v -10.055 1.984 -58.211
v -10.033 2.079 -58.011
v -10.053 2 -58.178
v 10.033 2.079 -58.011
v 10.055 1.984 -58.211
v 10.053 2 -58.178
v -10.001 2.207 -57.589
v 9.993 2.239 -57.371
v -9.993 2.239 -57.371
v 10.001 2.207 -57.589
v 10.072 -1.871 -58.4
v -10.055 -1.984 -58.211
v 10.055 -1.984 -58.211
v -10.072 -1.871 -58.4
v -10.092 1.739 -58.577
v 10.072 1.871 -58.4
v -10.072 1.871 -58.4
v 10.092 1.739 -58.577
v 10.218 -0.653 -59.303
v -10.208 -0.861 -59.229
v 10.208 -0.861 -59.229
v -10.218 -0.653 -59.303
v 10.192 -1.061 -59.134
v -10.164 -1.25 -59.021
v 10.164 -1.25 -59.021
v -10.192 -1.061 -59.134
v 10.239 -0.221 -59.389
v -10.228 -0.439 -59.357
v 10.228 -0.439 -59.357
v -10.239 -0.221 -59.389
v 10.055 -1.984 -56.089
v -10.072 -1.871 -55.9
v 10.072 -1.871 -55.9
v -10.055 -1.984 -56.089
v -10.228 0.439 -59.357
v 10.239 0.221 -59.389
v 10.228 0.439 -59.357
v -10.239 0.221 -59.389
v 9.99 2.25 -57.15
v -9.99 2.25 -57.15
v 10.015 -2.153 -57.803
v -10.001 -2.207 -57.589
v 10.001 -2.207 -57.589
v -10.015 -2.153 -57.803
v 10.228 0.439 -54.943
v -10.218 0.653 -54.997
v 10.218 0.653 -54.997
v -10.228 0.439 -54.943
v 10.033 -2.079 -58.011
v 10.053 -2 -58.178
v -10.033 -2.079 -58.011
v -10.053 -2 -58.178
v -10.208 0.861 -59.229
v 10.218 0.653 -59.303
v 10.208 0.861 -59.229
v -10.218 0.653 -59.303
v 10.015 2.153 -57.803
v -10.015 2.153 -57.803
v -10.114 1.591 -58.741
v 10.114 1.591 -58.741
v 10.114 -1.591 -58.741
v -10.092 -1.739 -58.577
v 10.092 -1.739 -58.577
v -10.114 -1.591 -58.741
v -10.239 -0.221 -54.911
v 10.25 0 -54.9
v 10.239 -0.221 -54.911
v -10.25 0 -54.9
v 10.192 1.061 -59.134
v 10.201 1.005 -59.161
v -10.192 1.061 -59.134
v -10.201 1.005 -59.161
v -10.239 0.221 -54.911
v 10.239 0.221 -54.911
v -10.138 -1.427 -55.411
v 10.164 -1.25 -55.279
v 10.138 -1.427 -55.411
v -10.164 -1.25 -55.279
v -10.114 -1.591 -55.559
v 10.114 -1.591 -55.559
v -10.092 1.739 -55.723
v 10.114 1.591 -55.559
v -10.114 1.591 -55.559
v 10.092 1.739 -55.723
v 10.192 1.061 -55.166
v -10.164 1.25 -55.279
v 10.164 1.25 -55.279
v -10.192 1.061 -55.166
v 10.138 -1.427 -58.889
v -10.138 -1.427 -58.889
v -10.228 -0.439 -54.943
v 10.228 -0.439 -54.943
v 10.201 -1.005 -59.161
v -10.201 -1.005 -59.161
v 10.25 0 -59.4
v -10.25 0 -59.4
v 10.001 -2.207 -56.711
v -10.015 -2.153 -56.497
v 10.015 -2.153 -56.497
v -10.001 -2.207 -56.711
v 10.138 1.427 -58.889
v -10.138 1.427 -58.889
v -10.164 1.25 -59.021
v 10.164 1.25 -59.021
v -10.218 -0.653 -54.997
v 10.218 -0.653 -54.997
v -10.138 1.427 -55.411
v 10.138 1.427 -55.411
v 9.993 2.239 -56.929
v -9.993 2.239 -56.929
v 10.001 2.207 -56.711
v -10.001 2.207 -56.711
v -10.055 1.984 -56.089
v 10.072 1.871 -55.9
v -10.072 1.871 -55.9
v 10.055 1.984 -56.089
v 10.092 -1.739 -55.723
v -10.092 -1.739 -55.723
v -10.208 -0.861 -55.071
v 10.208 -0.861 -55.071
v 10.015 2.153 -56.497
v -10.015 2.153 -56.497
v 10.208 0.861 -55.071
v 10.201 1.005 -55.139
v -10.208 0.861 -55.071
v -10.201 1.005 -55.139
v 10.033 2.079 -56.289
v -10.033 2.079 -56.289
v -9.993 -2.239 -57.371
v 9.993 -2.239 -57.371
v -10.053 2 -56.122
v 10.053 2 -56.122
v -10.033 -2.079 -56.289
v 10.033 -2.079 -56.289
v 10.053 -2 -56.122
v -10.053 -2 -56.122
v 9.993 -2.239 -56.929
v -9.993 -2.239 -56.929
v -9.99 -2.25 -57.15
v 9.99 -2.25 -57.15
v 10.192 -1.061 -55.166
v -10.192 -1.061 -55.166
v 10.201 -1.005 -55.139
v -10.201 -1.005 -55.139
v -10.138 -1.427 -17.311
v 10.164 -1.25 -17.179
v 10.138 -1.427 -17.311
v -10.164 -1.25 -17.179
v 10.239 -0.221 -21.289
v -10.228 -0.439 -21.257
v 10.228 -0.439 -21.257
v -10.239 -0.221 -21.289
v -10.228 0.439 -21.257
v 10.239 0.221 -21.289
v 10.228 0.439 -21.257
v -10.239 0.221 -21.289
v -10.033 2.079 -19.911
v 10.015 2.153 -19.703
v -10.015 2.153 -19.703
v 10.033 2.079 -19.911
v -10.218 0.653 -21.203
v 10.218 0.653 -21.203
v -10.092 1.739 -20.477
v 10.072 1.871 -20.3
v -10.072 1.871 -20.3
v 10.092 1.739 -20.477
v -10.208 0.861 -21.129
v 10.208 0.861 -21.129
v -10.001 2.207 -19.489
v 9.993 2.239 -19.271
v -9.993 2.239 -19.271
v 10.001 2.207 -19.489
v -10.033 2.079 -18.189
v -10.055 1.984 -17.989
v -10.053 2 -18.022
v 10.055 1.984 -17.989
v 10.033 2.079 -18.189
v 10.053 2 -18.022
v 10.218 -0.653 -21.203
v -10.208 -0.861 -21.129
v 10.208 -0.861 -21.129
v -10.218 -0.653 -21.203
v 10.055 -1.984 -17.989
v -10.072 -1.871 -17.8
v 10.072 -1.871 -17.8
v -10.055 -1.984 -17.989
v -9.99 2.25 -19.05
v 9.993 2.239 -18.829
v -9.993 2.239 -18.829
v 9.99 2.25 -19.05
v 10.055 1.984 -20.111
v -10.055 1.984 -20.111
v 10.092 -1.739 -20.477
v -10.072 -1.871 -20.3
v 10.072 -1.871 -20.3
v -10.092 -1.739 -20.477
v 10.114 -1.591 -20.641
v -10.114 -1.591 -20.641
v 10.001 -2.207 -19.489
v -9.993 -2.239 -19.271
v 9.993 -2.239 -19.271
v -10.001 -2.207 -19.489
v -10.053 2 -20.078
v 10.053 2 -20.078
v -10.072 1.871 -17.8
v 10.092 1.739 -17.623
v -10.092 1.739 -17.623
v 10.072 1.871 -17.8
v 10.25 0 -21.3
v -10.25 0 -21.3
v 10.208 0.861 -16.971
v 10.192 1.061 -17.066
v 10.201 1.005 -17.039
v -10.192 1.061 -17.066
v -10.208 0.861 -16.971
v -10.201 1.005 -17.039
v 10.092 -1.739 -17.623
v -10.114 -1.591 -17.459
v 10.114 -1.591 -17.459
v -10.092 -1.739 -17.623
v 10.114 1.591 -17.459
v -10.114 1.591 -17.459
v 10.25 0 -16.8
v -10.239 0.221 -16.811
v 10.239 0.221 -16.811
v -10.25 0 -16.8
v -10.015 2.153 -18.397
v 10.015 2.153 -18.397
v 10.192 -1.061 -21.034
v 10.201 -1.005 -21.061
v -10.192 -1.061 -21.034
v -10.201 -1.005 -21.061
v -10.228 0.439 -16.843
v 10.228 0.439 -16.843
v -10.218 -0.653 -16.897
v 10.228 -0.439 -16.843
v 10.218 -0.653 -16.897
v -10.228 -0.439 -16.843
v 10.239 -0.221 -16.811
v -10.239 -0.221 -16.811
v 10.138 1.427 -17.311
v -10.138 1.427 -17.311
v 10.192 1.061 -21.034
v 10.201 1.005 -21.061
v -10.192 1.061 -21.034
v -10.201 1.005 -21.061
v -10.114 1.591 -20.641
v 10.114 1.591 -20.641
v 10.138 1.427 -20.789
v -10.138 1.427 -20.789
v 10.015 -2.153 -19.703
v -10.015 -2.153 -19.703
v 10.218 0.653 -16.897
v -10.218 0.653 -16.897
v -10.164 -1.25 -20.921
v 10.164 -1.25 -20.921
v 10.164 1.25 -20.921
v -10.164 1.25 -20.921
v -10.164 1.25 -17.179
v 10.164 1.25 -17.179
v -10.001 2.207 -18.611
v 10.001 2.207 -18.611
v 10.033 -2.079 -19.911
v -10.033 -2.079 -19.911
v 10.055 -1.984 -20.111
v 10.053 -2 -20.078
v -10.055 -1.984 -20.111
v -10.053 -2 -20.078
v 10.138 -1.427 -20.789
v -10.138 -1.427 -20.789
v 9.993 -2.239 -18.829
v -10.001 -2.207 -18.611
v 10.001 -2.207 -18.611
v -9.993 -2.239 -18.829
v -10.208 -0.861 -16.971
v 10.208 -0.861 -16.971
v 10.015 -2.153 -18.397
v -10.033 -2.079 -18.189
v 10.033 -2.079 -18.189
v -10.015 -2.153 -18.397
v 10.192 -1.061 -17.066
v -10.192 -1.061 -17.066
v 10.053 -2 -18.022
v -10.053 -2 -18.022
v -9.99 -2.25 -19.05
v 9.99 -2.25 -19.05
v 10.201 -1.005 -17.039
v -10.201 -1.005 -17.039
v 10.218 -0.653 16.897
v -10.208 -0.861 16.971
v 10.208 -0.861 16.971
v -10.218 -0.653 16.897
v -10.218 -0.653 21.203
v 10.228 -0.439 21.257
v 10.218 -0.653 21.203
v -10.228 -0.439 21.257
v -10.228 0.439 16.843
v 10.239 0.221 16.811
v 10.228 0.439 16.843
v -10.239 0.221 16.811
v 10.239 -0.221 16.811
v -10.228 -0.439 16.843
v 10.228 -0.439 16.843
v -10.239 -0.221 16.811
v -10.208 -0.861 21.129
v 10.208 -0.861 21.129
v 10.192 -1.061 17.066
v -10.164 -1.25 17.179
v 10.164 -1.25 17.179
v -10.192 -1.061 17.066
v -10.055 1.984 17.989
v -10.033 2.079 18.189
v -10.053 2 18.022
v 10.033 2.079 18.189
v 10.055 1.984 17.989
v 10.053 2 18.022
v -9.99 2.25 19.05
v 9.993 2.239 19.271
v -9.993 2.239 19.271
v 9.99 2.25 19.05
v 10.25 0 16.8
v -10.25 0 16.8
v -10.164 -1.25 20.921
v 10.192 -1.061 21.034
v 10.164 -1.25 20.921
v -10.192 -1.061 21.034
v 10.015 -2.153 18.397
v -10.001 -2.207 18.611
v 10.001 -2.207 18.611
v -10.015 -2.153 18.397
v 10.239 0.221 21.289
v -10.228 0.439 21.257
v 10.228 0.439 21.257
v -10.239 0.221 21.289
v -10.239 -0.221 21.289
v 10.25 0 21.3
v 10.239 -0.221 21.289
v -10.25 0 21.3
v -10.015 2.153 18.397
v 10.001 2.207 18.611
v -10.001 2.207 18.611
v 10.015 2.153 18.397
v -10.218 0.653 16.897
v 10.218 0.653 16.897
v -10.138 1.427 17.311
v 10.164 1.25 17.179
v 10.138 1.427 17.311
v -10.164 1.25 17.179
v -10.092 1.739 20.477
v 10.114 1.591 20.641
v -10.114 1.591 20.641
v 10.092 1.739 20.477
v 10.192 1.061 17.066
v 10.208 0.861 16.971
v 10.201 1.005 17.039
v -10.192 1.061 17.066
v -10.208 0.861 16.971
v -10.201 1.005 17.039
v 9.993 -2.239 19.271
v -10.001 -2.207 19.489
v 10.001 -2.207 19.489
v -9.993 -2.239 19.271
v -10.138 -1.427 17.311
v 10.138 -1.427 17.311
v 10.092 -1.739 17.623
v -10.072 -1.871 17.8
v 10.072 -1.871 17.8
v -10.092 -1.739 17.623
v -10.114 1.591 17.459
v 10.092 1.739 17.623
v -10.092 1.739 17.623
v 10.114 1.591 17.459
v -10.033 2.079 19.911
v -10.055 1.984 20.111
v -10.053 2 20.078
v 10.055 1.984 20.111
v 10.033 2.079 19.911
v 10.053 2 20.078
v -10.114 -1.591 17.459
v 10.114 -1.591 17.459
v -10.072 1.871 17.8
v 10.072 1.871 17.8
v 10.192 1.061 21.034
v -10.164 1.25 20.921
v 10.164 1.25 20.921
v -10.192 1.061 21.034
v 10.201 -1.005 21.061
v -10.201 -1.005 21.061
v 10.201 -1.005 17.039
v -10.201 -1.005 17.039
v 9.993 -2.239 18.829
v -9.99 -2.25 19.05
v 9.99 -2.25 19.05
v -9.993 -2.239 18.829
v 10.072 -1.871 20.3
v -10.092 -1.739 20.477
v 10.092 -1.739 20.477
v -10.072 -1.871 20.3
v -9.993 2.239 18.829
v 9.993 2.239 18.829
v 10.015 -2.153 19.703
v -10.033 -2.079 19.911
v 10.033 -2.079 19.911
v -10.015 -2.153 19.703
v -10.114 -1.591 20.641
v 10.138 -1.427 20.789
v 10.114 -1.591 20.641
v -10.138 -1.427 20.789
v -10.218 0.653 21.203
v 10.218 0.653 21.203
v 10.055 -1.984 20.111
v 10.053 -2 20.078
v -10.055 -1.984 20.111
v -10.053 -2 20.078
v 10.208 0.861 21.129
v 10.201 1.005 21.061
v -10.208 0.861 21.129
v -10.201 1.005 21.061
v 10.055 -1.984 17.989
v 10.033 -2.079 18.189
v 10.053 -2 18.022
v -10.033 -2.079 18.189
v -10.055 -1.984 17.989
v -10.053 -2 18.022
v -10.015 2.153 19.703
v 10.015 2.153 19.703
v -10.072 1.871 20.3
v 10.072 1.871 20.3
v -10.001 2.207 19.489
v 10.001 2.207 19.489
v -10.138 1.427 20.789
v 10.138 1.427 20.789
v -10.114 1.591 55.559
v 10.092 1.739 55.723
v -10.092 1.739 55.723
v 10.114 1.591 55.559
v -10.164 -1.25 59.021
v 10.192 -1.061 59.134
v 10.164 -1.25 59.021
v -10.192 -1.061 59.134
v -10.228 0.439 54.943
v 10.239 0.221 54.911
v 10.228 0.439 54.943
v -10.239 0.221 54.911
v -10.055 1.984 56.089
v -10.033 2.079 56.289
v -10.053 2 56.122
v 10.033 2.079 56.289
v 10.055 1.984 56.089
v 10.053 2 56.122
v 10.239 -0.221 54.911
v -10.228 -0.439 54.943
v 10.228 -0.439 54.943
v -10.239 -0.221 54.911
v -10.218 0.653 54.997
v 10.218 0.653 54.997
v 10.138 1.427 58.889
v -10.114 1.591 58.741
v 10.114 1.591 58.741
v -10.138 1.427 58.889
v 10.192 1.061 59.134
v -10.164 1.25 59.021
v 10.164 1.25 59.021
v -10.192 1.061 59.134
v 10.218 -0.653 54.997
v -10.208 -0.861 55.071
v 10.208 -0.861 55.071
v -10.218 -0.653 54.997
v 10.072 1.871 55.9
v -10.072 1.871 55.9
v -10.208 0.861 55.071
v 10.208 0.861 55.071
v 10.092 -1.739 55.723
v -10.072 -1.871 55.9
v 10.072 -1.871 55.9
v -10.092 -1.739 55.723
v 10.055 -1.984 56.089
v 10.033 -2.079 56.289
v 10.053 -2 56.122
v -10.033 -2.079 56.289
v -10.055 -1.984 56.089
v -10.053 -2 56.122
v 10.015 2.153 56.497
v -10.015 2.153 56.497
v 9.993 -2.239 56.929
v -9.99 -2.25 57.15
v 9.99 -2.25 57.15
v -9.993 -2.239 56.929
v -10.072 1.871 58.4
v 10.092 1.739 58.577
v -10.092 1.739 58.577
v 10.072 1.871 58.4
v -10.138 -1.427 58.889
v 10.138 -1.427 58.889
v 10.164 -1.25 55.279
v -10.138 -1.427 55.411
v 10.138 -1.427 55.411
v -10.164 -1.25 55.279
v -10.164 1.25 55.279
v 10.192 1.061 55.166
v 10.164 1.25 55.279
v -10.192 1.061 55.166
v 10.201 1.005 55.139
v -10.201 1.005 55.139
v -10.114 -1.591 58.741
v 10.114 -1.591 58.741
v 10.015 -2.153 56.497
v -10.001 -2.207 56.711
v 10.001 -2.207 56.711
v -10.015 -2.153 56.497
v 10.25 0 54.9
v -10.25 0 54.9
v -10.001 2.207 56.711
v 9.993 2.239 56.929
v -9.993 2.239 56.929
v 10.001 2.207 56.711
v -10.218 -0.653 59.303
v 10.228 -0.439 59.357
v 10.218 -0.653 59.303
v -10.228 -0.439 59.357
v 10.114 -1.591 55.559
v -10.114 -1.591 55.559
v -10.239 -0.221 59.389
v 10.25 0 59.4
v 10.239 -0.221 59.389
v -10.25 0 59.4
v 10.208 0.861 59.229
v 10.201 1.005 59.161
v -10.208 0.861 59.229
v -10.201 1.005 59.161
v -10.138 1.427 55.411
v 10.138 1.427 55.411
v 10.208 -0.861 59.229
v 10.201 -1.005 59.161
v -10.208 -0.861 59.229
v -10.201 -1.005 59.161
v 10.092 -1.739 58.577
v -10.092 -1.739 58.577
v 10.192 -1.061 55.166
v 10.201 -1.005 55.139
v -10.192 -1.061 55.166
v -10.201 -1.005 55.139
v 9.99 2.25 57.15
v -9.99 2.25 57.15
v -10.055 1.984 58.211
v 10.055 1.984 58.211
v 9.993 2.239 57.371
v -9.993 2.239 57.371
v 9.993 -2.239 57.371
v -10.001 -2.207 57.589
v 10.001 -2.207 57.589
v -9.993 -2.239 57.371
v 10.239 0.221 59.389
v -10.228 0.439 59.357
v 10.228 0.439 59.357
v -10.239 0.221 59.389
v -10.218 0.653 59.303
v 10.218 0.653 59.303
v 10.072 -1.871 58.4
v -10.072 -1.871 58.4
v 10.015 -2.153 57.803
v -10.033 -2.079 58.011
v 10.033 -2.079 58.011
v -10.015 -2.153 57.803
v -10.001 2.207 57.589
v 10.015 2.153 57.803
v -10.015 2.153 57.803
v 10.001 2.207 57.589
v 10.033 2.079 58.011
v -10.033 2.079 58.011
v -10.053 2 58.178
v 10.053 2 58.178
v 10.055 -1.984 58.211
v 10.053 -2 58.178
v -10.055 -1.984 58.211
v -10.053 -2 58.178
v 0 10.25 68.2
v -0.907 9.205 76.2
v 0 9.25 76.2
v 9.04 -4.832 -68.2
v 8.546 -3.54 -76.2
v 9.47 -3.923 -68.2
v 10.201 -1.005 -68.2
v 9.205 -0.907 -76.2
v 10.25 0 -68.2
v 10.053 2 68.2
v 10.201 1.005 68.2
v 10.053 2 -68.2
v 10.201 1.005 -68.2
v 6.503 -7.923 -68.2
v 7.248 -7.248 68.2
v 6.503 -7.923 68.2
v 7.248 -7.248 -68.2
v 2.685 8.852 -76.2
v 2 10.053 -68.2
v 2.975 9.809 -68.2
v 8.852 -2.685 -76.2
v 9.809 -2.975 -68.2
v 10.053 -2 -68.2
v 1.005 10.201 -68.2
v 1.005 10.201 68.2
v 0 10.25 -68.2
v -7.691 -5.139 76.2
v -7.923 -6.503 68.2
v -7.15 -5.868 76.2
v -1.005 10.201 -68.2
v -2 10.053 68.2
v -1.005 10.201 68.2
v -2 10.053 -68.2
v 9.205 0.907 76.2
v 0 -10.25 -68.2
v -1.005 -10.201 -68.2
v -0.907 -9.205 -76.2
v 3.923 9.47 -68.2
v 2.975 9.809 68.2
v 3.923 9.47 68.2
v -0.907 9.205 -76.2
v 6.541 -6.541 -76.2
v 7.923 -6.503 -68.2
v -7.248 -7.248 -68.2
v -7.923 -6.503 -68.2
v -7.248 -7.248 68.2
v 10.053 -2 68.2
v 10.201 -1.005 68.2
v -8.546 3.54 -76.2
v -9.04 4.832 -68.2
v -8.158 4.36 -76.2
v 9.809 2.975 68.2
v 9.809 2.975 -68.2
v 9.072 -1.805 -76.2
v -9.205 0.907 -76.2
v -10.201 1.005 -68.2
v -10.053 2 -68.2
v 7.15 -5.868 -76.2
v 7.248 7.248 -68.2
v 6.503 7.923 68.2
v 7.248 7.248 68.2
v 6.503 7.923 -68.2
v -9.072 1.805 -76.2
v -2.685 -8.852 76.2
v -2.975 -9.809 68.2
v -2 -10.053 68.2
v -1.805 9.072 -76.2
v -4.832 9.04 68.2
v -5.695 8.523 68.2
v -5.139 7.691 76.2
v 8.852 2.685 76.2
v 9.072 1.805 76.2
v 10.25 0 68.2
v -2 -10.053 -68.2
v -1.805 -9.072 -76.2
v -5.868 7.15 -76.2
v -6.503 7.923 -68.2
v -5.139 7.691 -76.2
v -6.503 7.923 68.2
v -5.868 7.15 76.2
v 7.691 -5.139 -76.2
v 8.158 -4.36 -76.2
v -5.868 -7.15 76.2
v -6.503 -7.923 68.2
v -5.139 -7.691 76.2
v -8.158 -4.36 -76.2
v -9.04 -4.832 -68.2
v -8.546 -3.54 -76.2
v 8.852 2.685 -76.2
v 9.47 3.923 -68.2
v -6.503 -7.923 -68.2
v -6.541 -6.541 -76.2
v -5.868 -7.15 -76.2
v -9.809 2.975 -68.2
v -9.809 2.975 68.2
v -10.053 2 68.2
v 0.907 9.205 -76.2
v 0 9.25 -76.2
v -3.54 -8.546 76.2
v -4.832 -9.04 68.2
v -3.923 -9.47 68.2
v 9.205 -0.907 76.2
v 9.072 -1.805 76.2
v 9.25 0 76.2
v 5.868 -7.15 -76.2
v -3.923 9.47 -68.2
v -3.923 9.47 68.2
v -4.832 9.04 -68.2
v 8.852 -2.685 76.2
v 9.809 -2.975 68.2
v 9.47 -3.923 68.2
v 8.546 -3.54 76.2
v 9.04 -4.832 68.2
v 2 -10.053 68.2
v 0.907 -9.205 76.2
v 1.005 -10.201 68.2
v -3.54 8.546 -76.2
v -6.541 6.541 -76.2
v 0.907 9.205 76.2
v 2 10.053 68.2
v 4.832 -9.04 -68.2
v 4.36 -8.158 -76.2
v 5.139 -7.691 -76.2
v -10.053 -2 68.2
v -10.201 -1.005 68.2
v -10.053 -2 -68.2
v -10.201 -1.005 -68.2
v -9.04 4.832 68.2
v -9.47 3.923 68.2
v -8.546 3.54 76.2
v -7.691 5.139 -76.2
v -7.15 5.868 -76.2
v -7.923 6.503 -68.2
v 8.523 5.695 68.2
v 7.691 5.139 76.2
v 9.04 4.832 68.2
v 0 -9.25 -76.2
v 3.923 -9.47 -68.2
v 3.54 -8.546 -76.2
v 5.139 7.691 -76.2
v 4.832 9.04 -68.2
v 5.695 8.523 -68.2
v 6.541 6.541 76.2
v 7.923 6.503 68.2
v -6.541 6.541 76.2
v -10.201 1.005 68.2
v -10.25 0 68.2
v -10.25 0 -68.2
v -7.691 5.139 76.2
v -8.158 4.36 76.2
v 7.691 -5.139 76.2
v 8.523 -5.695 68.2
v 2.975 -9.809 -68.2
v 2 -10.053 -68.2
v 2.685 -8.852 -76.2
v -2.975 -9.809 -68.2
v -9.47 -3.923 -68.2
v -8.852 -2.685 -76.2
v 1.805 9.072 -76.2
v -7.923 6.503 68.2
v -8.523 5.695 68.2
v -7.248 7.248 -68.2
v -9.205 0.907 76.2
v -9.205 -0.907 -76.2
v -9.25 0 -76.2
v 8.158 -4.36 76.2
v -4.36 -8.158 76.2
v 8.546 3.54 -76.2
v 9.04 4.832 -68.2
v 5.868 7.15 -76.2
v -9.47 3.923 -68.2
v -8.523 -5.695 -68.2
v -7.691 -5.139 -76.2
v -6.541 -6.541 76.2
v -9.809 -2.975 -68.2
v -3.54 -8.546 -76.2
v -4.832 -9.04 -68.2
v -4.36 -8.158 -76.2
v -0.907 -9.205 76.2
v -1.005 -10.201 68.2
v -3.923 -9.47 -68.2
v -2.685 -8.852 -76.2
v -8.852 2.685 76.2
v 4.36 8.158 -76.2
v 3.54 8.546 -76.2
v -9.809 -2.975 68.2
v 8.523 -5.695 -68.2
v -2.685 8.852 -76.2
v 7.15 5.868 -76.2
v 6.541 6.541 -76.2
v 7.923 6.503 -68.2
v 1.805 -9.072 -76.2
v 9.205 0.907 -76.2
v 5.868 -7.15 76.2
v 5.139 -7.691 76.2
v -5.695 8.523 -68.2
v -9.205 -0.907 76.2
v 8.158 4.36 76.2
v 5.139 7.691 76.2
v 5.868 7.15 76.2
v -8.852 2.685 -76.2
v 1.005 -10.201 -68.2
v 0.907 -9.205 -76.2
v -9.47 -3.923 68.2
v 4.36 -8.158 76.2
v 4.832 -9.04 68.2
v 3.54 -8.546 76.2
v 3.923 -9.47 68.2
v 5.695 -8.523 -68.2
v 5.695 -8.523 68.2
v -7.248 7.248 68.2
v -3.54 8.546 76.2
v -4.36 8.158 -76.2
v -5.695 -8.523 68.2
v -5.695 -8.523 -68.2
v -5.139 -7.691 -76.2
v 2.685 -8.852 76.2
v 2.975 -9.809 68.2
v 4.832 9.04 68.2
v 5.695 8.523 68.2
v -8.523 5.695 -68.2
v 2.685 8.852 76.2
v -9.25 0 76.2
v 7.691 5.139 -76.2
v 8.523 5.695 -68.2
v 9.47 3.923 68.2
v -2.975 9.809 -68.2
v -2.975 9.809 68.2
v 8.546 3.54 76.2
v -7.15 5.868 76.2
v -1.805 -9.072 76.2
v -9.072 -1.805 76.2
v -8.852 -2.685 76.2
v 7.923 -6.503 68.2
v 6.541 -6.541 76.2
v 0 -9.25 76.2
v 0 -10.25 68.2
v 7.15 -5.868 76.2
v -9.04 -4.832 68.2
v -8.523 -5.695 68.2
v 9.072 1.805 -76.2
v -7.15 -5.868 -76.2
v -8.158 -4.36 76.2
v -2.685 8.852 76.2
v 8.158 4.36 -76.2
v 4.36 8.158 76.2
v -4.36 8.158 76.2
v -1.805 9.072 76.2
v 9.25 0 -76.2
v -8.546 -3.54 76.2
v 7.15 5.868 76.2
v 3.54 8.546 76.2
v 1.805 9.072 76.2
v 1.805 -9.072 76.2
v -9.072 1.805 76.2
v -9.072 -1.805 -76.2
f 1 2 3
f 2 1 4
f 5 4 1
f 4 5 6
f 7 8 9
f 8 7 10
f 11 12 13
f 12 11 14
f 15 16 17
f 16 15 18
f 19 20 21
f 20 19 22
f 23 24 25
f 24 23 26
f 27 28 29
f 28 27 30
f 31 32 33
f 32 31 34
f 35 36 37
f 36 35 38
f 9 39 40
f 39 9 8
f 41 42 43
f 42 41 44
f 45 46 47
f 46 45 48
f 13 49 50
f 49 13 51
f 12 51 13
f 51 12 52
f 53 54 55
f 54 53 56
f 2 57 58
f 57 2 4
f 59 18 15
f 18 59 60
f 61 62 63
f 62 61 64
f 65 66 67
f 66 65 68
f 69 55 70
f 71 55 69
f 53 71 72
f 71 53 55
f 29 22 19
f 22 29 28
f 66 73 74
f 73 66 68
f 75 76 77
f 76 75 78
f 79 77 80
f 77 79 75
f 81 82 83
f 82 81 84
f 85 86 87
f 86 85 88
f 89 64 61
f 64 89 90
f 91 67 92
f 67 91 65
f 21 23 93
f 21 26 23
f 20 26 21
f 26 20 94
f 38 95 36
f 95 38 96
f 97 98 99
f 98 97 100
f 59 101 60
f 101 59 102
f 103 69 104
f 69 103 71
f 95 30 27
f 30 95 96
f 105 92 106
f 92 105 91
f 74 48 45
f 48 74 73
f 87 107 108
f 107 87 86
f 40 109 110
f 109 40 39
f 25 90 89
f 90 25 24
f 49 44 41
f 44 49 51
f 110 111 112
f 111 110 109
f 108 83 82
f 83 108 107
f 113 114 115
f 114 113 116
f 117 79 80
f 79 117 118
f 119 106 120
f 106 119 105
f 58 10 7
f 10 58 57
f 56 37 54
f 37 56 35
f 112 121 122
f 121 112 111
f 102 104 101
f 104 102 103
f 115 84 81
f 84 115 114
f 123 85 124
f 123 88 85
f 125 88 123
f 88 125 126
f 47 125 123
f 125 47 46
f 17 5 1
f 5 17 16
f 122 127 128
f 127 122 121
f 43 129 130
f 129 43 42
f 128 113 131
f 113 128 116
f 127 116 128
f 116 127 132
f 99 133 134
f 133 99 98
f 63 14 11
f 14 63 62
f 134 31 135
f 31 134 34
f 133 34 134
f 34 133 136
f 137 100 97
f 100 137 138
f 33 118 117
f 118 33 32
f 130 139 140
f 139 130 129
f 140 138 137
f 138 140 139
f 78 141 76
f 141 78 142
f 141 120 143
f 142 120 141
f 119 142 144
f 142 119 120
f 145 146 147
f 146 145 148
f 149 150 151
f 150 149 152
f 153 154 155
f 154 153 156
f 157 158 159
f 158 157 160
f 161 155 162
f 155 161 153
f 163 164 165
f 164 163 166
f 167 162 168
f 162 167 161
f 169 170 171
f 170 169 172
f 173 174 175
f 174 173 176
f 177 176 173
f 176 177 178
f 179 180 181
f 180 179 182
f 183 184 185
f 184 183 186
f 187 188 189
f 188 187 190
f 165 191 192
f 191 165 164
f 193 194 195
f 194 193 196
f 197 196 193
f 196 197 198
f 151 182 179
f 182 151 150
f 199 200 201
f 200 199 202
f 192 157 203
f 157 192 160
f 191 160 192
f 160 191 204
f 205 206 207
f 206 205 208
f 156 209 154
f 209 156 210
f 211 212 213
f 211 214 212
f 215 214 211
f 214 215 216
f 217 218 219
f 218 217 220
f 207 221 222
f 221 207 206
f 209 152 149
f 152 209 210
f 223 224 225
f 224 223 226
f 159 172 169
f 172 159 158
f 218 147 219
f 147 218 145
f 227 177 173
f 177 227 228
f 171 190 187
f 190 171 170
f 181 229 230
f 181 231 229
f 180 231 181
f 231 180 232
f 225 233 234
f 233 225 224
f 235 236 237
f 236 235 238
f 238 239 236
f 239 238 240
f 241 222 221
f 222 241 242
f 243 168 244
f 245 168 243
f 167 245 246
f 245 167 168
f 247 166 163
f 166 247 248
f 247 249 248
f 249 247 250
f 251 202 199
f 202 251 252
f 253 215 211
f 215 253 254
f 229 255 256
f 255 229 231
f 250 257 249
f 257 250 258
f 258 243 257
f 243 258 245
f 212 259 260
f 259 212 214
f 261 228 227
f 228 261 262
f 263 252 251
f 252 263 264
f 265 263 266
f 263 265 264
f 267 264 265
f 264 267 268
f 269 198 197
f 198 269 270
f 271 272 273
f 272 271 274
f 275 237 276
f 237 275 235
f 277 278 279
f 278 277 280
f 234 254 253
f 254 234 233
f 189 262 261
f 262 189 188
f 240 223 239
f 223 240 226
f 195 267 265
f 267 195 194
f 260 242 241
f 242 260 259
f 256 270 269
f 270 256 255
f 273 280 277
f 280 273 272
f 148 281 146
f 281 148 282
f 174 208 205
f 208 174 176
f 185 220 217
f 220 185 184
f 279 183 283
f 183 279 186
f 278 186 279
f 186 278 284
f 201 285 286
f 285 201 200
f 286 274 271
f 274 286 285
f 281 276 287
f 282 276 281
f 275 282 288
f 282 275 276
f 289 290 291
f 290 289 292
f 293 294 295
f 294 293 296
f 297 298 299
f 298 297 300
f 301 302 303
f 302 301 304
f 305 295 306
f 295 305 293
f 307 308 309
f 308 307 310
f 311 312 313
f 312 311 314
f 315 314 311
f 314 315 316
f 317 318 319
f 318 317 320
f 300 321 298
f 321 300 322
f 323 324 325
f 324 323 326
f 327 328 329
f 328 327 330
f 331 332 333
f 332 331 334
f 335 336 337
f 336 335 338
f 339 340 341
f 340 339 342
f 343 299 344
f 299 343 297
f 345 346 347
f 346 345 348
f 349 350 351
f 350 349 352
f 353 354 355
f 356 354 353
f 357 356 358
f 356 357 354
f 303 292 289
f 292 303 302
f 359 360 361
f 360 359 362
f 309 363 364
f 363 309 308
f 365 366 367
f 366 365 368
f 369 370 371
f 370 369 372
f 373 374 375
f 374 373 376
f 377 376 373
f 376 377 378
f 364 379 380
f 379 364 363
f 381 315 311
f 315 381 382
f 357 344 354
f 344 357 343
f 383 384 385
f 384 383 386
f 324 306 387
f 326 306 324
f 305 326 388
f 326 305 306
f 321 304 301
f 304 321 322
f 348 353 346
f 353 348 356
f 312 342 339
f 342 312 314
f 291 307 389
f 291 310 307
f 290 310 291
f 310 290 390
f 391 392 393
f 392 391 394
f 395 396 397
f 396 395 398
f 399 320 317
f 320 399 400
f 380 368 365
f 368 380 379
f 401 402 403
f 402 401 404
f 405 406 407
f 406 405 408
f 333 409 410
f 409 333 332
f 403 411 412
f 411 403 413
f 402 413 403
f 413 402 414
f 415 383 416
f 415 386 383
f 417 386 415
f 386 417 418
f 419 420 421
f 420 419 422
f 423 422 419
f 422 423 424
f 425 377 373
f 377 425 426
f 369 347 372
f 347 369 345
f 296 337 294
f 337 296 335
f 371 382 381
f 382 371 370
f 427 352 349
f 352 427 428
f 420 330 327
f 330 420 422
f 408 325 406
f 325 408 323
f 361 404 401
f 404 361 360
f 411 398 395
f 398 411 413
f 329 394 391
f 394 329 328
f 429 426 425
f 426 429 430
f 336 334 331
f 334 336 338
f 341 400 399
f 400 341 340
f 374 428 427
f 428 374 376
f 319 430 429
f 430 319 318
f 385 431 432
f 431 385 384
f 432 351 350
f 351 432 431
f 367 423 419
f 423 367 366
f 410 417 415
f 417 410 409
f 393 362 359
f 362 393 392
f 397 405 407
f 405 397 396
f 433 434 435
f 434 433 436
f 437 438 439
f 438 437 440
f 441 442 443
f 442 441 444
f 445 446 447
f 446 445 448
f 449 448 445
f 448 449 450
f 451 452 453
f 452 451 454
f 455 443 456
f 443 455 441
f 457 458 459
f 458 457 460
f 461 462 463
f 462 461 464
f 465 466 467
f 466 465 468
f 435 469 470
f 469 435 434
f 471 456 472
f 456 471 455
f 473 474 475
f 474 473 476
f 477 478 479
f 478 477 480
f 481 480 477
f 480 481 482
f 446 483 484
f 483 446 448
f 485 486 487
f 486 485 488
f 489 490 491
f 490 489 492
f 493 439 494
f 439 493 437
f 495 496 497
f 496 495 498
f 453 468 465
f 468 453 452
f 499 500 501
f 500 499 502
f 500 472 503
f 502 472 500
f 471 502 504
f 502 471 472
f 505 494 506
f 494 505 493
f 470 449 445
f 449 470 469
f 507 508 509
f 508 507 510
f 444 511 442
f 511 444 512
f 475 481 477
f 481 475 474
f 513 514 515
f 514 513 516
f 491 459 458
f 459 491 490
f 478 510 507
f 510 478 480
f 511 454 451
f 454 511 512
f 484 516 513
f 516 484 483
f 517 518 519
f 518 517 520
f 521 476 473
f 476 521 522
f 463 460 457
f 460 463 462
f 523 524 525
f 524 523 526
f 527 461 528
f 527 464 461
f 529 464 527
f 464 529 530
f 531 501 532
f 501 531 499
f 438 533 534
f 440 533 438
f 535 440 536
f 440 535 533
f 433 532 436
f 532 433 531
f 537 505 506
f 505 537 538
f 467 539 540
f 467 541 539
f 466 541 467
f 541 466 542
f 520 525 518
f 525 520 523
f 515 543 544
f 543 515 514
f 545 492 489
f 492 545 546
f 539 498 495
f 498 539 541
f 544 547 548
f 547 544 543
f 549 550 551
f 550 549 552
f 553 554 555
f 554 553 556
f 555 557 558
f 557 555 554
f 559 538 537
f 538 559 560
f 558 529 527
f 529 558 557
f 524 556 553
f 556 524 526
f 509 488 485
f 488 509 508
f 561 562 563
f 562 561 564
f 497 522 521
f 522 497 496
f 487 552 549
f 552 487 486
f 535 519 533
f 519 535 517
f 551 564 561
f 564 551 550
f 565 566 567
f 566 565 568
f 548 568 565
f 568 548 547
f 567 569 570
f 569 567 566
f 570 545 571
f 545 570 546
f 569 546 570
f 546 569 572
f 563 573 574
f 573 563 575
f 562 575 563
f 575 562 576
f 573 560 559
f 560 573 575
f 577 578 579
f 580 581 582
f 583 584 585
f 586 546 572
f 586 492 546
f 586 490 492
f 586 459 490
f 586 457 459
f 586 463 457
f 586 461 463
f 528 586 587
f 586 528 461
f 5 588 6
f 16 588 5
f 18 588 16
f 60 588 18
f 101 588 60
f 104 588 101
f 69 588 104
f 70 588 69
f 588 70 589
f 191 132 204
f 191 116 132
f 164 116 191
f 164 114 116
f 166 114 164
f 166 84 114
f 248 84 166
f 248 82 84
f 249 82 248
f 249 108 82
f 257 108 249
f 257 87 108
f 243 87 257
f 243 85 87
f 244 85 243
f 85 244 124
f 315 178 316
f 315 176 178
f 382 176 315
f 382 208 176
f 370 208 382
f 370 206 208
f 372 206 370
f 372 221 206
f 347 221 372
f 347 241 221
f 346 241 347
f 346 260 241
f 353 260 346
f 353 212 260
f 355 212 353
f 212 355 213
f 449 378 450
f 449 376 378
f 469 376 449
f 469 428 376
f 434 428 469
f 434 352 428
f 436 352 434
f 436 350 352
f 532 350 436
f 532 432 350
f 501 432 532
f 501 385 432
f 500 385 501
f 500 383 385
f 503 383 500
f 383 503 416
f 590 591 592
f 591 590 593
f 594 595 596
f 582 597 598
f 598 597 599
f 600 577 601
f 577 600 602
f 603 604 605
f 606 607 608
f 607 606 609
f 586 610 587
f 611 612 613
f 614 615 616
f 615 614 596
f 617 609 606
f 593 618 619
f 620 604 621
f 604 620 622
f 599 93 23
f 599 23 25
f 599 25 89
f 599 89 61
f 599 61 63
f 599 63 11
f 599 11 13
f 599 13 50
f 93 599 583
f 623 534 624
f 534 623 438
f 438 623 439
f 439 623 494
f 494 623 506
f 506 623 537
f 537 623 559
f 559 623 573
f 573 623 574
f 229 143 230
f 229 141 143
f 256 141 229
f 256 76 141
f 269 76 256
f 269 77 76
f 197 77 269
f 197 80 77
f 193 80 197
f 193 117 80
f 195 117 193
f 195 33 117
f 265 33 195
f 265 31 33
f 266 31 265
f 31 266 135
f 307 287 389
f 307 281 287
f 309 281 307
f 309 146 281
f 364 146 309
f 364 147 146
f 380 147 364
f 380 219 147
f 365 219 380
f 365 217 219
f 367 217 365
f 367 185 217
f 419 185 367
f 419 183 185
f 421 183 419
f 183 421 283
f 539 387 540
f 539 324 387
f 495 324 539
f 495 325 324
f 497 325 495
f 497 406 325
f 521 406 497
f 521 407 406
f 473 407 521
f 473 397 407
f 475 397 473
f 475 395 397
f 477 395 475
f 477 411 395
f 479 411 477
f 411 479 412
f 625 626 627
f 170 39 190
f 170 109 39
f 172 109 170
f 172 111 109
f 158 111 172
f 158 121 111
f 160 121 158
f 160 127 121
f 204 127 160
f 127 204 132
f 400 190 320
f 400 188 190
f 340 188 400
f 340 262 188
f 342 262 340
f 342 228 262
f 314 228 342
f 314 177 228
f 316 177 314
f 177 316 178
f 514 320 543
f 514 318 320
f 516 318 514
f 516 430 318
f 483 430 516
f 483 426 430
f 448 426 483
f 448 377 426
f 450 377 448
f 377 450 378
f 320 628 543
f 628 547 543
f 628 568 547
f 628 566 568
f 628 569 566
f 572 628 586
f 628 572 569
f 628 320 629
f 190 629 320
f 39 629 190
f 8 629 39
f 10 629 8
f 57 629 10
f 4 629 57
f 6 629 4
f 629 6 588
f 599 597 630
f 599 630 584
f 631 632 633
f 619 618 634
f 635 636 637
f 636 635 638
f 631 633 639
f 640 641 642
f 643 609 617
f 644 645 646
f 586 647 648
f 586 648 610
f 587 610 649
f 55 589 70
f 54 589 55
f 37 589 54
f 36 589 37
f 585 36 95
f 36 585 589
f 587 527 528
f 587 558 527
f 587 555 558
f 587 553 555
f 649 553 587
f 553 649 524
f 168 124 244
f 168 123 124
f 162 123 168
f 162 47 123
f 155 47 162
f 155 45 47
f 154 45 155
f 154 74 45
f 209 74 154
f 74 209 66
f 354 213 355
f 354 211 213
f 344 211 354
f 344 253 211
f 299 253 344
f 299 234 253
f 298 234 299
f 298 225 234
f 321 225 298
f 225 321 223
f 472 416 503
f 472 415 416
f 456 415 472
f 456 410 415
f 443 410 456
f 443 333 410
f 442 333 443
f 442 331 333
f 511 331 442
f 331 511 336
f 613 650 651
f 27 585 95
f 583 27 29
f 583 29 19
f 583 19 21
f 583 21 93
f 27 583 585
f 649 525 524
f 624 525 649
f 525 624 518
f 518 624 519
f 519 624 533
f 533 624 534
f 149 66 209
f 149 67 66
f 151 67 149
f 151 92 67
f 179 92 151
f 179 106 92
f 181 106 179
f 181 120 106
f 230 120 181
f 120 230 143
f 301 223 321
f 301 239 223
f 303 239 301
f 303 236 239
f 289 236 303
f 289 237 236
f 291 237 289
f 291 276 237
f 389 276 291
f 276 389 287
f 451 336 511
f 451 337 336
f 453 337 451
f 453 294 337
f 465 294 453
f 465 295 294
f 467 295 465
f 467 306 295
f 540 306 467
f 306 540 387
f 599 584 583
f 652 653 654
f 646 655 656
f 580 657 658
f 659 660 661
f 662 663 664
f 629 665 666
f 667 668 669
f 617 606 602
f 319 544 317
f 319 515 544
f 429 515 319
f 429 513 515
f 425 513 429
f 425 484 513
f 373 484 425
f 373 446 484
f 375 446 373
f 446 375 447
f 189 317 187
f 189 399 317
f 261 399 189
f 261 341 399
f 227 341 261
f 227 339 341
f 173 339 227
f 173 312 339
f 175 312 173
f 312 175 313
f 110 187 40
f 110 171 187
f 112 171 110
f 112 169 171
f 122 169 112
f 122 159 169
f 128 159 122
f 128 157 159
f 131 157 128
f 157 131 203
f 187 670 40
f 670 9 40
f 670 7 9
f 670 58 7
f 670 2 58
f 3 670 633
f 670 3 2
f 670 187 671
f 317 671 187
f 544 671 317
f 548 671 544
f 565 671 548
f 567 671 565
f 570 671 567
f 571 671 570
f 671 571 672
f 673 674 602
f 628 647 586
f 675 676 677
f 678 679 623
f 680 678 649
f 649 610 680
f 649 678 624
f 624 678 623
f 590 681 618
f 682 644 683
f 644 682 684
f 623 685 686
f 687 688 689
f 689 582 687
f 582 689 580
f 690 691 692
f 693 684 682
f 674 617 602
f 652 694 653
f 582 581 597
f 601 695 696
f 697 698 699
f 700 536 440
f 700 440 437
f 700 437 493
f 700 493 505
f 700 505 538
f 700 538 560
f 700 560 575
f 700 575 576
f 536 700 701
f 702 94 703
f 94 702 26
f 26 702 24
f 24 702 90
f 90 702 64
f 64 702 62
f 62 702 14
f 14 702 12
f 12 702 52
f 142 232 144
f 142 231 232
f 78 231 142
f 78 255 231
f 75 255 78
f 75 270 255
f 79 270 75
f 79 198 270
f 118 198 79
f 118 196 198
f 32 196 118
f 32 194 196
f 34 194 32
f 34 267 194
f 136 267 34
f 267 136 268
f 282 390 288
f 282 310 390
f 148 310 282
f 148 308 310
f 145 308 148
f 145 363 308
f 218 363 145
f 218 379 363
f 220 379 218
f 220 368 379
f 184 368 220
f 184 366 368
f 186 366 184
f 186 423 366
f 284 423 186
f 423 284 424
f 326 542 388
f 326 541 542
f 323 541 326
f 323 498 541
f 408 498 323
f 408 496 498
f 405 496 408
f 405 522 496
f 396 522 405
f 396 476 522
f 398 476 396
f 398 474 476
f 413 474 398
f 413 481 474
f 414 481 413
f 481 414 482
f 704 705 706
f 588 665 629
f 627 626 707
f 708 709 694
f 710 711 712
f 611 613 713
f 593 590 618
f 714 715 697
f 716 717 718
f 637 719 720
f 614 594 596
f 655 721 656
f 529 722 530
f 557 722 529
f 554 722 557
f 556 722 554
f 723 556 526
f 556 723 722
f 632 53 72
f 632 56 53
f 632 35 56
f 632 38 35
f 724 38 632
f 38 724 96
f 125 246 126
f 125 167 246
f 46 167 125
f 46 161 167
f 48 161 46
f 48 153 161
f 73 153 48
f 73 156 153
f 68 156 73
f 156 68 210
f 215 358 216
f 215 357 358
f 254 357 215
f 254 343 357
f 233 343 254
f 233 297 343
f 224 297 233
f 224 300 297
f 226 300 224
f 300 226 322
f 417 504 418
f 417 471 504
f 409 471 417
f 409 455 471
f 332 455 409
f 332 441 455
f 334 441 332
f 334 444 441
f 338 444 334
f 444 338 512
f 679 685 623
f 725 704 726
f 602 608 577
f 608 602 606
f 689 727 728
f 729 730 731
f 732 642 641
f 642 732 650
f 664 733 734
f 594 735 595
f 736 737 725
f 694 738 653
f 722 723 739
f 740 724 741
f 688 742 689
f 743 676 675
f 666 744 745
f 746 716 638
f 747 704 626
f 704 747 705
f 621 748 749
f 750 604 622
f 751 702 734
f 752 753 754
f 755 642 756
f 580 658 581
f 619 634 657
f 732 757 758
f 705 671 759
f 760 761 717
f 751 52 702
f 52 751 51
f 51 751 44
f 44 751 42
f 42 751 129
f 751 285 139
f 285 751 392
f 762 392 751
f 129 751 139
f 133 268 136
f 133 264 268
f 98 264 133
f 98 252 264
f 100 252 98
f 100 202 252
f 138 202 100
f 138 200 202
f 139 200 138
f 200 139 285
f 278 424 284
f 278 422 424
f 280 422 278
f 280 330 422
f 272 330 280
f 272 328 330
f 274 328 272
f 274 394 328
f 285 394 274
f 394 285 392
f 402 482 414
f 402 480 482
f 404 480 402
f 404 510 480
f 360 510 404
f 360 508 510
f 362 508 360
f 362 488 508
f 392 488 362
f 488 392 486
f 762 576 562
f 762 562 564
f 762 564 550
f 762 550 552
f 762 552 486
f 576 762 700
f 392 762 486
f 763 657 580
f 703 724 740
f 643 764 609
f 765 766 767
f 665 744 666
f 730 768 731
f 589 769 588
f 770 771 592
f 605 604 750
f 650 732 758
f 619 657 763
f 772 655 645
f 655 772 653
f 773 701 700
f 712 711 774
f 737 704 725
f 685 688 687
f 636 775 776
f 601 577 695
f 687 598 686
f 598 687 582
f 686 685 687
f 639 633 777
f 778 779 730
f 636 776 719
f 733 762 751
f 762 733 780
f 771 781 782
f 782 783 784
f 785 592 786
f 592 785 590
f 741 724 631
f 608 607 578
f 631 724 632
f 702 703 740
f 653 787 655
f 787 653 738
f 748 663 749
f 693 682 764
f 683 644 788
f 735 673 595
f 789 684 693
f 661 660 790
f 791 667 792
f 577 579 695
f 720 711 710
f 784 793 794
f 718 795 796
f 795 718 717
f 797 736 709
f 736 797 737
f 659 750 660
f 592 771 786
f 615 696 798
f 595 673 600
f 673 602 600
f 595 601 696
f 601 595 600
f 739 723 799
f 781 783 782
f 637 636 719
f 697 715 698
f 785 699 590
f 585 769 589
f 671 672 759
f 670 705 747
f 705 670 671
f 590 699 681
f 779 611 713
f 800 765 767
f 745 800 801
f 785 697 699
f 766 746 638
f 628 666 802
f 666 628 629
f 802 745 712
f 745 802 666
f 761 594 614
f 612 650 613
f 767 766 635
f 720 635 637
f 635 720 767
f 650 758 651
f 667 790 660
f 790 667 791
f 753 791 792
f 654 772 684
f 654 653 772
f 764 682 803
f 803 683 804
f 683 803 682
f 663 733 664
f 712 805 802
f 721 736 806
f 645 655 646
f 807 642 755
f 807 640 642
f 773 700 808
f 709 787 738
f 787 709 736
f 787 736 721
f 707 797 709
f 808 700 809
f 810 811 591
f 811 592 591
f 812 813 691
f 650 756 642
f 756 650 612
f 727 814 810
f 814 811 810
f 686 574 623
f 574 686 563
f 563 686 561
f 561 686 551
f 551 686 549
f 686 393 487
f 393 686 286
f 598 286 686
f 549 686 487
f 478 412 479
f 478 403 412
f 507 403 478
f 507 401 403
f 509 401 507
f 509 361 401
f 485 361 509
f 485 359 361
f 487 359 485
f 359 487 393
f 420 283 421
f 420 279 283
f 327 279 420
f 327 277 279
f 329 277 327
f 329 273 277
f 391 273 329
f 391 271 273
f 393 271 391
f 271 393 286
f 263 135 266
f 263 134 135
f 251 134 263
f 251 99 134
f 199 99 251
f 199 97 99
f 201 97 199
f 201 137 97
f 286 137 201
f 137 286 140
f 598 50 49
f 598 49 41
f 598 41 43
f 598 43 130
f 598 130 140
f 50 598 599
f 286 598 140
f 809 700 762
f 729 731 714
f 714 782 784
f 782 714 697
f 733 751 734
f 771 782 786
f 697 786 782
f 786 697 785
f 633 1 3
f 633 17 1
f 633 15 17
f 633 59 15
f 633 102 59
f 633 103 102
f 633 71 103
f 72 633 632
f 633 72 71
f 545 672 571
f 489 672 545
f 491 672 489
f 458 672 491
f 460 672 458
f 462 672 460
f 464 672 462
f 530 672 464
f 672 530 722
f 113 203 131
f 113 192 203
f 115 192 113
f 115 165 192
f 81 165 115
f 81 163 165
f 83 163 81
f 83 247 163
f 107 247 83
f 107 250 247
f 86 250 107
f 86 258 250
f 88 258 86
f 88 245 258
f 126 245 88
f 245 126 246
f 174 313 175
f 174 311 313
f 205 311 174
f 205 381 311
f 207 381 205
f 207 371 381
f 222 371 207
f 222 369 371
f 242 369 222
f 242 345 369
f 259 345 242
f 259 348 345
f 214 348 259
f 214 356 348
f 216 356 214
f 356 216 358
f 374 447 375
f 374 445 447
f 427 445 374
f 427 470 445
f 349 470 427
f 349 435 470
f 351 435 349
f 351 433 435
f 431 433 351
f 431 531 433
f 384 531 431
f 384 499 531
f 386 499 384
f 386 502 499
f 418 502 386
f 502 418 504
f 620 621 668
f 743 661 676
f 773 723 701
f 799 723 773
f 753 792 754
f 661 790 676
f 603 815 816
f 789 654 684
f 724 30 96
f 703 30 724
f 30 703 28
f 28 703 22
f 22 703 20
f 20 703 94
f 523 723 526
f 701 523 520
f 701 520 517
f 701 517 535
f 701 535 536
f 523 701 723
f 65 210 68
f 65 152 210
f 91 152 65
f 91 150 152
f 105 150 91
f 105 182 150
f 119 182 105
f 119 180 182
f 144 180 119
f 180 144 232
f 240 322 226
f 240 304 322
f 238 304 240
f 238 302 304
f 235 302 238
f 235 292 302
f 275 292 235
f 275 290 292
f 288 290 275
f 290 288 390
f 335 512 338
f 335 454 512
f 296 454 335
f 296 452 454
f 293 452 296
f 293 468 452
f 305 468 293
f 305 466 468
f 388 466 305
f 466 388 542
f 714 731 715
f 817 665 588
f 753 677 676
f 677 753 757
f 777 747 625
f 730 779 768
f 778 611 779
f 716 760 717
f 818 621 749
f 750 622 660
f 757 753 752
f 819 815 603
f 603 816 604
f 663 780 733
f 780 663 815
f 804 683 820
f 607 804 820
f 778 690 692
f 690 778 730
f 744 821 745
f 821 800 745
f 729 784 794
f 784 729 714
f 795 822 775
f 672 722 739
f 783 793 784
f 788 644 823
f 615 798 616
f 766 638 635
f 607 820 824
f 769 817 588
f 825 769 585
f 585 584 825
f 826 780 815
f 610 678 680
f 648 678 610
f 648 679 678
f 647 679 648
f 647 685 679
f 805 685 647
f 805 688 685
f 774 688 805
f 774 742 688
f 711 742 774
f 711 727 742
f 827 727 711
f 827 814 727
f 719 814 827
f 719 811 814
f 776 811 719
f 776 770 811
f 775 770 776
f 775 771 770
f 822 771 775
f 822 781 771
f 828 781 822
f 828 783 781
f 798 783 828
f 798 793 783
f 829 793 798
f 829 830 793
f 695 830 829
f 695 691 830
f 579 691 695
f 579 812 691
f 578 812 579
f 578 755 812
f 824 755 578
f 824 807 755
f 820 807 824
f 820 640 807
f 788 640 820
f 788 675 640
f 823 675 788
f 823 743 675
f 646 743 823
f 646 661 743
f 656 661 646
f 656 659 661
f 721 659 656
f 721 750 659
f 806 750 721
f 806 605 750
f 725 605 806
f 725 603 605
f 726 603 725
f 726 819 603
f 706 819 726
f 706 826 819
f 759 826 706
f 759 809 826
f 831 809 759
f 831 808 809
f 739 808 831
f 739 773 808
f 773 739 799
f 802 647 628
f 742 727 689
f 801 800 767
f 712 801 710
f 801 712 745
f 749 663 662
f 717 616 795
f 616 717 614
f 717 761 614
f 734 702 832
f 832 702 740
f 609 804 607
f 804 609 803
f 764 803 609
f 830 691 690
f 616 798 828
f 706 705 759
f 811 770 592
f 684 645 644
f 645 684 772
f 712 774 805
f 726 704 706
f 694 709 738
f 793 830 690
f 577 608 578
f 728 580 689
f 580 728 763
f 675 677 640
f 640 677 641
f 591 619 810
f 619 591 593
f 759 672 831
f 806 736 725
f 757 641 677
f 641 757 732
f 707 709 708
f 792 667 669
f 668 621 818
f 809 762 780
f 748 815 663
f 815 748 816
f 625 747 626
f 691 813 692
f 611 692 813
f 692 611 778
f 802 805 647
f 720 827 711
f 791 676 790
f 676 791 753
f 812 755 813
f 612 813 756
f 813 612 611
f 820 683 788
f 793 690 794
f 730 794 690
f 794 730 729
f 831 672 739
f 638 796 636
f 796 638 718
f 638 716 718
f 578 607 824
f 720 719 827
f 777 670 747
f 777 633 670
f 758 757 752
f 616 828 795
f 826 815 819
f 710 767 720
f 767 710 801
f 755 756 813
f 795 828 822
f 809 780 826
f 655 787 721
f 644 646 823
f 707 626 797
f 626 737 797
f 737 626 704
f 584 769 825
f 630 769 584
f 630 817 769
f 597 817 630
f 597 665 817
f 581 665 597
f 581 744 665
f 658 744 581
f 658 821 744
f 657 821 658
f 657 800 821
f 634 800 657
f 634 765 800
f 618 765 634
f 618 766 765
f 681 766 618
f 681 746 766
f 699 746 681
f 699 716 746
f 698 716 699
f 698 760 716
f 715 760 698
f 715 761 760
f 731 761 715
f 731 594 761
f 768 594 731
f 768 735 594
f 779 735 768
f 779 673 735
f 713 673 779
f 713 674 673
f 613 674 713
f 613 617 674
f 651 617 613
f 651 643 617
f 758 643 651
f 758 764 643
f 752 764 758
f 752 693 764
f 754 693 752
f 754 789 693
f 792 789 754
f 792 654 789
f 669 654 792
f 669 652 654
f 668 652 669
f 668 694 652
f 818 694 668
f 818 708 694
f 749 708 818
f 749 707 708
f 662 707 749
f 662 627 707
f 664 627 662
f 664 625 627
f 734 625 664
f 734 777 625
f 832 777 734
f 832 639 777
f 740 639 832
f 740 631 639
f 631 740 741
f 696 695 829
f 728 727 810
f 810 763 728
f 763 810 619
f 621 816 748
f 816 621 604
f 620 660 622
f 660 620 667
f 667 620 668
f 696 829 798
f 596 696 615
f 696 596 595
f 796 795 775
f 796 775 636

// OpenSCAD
// BroomHandleMender1.0
// 
// It's just a sliced cylinder with screw holes
// you can stick inside the broom handle.

length = "6inch";
diameter = "20.5mm";
slicey_mcthickness = "";
hole_diameter = "4.5mm";
$fn = 64;

use <../lib/TOGMod1.scad>
use <../lib/TOGMod1Constructors.scad>
use <../lib/TOGPolyhedronLib1.scad>
use <../lib/TOGThreads2.scad>
use <../lib/TOGUnits1.scad>

inf = 65536; // 4294967296; // Nice round 'close enough to infinity' number

length_mm = togunits1_to_mm(length);
length_chunks = togunits1_decode(length, unit="chunk", xf="round");
chunk = togunits1_to_mm("chunk");
diameter_mm = togunits1_to_mm(diameter);
slicey_mcthickness_mm = slicey_mcthickness == "" ? inf : togunits1_to_mm(slicey_mcthickness);
hole_diameter_mm = togunits1_to_mm(hole_diameter);

togmod1_domodule(
	let( slicey_mcintersector = slicey_mcthickness_mm == inf ? ["intersection"] : togmod1_make_cuboid([inf, slicey_mcthickness_mm, inf]) )
	let( hole = ["rotate", [0,90,0], tphl1_make_z_cylinder(zrange=[-diameter_mm, diameter_mm], d=hole_diameter_mm)] )
	["difference",
		["intersection",
			slicey_mcintersector,
			tphl1_make_z_cylinder(zds=[
				[-length_mm/2  , diameter_mm-2],
				[-length_mm/2+8, diameter_mm  ],
				[ length_mm/2-8, diameter_mm  ],
				[ length_mm/2  , diameter_mm-2],
			])
		],
		
		for( zm=[-length_chunks/2+0.5 : 1 : length_chunks/2-0.5] )
		["translate", [0,0,zm*chunk], hole],
	]
);
